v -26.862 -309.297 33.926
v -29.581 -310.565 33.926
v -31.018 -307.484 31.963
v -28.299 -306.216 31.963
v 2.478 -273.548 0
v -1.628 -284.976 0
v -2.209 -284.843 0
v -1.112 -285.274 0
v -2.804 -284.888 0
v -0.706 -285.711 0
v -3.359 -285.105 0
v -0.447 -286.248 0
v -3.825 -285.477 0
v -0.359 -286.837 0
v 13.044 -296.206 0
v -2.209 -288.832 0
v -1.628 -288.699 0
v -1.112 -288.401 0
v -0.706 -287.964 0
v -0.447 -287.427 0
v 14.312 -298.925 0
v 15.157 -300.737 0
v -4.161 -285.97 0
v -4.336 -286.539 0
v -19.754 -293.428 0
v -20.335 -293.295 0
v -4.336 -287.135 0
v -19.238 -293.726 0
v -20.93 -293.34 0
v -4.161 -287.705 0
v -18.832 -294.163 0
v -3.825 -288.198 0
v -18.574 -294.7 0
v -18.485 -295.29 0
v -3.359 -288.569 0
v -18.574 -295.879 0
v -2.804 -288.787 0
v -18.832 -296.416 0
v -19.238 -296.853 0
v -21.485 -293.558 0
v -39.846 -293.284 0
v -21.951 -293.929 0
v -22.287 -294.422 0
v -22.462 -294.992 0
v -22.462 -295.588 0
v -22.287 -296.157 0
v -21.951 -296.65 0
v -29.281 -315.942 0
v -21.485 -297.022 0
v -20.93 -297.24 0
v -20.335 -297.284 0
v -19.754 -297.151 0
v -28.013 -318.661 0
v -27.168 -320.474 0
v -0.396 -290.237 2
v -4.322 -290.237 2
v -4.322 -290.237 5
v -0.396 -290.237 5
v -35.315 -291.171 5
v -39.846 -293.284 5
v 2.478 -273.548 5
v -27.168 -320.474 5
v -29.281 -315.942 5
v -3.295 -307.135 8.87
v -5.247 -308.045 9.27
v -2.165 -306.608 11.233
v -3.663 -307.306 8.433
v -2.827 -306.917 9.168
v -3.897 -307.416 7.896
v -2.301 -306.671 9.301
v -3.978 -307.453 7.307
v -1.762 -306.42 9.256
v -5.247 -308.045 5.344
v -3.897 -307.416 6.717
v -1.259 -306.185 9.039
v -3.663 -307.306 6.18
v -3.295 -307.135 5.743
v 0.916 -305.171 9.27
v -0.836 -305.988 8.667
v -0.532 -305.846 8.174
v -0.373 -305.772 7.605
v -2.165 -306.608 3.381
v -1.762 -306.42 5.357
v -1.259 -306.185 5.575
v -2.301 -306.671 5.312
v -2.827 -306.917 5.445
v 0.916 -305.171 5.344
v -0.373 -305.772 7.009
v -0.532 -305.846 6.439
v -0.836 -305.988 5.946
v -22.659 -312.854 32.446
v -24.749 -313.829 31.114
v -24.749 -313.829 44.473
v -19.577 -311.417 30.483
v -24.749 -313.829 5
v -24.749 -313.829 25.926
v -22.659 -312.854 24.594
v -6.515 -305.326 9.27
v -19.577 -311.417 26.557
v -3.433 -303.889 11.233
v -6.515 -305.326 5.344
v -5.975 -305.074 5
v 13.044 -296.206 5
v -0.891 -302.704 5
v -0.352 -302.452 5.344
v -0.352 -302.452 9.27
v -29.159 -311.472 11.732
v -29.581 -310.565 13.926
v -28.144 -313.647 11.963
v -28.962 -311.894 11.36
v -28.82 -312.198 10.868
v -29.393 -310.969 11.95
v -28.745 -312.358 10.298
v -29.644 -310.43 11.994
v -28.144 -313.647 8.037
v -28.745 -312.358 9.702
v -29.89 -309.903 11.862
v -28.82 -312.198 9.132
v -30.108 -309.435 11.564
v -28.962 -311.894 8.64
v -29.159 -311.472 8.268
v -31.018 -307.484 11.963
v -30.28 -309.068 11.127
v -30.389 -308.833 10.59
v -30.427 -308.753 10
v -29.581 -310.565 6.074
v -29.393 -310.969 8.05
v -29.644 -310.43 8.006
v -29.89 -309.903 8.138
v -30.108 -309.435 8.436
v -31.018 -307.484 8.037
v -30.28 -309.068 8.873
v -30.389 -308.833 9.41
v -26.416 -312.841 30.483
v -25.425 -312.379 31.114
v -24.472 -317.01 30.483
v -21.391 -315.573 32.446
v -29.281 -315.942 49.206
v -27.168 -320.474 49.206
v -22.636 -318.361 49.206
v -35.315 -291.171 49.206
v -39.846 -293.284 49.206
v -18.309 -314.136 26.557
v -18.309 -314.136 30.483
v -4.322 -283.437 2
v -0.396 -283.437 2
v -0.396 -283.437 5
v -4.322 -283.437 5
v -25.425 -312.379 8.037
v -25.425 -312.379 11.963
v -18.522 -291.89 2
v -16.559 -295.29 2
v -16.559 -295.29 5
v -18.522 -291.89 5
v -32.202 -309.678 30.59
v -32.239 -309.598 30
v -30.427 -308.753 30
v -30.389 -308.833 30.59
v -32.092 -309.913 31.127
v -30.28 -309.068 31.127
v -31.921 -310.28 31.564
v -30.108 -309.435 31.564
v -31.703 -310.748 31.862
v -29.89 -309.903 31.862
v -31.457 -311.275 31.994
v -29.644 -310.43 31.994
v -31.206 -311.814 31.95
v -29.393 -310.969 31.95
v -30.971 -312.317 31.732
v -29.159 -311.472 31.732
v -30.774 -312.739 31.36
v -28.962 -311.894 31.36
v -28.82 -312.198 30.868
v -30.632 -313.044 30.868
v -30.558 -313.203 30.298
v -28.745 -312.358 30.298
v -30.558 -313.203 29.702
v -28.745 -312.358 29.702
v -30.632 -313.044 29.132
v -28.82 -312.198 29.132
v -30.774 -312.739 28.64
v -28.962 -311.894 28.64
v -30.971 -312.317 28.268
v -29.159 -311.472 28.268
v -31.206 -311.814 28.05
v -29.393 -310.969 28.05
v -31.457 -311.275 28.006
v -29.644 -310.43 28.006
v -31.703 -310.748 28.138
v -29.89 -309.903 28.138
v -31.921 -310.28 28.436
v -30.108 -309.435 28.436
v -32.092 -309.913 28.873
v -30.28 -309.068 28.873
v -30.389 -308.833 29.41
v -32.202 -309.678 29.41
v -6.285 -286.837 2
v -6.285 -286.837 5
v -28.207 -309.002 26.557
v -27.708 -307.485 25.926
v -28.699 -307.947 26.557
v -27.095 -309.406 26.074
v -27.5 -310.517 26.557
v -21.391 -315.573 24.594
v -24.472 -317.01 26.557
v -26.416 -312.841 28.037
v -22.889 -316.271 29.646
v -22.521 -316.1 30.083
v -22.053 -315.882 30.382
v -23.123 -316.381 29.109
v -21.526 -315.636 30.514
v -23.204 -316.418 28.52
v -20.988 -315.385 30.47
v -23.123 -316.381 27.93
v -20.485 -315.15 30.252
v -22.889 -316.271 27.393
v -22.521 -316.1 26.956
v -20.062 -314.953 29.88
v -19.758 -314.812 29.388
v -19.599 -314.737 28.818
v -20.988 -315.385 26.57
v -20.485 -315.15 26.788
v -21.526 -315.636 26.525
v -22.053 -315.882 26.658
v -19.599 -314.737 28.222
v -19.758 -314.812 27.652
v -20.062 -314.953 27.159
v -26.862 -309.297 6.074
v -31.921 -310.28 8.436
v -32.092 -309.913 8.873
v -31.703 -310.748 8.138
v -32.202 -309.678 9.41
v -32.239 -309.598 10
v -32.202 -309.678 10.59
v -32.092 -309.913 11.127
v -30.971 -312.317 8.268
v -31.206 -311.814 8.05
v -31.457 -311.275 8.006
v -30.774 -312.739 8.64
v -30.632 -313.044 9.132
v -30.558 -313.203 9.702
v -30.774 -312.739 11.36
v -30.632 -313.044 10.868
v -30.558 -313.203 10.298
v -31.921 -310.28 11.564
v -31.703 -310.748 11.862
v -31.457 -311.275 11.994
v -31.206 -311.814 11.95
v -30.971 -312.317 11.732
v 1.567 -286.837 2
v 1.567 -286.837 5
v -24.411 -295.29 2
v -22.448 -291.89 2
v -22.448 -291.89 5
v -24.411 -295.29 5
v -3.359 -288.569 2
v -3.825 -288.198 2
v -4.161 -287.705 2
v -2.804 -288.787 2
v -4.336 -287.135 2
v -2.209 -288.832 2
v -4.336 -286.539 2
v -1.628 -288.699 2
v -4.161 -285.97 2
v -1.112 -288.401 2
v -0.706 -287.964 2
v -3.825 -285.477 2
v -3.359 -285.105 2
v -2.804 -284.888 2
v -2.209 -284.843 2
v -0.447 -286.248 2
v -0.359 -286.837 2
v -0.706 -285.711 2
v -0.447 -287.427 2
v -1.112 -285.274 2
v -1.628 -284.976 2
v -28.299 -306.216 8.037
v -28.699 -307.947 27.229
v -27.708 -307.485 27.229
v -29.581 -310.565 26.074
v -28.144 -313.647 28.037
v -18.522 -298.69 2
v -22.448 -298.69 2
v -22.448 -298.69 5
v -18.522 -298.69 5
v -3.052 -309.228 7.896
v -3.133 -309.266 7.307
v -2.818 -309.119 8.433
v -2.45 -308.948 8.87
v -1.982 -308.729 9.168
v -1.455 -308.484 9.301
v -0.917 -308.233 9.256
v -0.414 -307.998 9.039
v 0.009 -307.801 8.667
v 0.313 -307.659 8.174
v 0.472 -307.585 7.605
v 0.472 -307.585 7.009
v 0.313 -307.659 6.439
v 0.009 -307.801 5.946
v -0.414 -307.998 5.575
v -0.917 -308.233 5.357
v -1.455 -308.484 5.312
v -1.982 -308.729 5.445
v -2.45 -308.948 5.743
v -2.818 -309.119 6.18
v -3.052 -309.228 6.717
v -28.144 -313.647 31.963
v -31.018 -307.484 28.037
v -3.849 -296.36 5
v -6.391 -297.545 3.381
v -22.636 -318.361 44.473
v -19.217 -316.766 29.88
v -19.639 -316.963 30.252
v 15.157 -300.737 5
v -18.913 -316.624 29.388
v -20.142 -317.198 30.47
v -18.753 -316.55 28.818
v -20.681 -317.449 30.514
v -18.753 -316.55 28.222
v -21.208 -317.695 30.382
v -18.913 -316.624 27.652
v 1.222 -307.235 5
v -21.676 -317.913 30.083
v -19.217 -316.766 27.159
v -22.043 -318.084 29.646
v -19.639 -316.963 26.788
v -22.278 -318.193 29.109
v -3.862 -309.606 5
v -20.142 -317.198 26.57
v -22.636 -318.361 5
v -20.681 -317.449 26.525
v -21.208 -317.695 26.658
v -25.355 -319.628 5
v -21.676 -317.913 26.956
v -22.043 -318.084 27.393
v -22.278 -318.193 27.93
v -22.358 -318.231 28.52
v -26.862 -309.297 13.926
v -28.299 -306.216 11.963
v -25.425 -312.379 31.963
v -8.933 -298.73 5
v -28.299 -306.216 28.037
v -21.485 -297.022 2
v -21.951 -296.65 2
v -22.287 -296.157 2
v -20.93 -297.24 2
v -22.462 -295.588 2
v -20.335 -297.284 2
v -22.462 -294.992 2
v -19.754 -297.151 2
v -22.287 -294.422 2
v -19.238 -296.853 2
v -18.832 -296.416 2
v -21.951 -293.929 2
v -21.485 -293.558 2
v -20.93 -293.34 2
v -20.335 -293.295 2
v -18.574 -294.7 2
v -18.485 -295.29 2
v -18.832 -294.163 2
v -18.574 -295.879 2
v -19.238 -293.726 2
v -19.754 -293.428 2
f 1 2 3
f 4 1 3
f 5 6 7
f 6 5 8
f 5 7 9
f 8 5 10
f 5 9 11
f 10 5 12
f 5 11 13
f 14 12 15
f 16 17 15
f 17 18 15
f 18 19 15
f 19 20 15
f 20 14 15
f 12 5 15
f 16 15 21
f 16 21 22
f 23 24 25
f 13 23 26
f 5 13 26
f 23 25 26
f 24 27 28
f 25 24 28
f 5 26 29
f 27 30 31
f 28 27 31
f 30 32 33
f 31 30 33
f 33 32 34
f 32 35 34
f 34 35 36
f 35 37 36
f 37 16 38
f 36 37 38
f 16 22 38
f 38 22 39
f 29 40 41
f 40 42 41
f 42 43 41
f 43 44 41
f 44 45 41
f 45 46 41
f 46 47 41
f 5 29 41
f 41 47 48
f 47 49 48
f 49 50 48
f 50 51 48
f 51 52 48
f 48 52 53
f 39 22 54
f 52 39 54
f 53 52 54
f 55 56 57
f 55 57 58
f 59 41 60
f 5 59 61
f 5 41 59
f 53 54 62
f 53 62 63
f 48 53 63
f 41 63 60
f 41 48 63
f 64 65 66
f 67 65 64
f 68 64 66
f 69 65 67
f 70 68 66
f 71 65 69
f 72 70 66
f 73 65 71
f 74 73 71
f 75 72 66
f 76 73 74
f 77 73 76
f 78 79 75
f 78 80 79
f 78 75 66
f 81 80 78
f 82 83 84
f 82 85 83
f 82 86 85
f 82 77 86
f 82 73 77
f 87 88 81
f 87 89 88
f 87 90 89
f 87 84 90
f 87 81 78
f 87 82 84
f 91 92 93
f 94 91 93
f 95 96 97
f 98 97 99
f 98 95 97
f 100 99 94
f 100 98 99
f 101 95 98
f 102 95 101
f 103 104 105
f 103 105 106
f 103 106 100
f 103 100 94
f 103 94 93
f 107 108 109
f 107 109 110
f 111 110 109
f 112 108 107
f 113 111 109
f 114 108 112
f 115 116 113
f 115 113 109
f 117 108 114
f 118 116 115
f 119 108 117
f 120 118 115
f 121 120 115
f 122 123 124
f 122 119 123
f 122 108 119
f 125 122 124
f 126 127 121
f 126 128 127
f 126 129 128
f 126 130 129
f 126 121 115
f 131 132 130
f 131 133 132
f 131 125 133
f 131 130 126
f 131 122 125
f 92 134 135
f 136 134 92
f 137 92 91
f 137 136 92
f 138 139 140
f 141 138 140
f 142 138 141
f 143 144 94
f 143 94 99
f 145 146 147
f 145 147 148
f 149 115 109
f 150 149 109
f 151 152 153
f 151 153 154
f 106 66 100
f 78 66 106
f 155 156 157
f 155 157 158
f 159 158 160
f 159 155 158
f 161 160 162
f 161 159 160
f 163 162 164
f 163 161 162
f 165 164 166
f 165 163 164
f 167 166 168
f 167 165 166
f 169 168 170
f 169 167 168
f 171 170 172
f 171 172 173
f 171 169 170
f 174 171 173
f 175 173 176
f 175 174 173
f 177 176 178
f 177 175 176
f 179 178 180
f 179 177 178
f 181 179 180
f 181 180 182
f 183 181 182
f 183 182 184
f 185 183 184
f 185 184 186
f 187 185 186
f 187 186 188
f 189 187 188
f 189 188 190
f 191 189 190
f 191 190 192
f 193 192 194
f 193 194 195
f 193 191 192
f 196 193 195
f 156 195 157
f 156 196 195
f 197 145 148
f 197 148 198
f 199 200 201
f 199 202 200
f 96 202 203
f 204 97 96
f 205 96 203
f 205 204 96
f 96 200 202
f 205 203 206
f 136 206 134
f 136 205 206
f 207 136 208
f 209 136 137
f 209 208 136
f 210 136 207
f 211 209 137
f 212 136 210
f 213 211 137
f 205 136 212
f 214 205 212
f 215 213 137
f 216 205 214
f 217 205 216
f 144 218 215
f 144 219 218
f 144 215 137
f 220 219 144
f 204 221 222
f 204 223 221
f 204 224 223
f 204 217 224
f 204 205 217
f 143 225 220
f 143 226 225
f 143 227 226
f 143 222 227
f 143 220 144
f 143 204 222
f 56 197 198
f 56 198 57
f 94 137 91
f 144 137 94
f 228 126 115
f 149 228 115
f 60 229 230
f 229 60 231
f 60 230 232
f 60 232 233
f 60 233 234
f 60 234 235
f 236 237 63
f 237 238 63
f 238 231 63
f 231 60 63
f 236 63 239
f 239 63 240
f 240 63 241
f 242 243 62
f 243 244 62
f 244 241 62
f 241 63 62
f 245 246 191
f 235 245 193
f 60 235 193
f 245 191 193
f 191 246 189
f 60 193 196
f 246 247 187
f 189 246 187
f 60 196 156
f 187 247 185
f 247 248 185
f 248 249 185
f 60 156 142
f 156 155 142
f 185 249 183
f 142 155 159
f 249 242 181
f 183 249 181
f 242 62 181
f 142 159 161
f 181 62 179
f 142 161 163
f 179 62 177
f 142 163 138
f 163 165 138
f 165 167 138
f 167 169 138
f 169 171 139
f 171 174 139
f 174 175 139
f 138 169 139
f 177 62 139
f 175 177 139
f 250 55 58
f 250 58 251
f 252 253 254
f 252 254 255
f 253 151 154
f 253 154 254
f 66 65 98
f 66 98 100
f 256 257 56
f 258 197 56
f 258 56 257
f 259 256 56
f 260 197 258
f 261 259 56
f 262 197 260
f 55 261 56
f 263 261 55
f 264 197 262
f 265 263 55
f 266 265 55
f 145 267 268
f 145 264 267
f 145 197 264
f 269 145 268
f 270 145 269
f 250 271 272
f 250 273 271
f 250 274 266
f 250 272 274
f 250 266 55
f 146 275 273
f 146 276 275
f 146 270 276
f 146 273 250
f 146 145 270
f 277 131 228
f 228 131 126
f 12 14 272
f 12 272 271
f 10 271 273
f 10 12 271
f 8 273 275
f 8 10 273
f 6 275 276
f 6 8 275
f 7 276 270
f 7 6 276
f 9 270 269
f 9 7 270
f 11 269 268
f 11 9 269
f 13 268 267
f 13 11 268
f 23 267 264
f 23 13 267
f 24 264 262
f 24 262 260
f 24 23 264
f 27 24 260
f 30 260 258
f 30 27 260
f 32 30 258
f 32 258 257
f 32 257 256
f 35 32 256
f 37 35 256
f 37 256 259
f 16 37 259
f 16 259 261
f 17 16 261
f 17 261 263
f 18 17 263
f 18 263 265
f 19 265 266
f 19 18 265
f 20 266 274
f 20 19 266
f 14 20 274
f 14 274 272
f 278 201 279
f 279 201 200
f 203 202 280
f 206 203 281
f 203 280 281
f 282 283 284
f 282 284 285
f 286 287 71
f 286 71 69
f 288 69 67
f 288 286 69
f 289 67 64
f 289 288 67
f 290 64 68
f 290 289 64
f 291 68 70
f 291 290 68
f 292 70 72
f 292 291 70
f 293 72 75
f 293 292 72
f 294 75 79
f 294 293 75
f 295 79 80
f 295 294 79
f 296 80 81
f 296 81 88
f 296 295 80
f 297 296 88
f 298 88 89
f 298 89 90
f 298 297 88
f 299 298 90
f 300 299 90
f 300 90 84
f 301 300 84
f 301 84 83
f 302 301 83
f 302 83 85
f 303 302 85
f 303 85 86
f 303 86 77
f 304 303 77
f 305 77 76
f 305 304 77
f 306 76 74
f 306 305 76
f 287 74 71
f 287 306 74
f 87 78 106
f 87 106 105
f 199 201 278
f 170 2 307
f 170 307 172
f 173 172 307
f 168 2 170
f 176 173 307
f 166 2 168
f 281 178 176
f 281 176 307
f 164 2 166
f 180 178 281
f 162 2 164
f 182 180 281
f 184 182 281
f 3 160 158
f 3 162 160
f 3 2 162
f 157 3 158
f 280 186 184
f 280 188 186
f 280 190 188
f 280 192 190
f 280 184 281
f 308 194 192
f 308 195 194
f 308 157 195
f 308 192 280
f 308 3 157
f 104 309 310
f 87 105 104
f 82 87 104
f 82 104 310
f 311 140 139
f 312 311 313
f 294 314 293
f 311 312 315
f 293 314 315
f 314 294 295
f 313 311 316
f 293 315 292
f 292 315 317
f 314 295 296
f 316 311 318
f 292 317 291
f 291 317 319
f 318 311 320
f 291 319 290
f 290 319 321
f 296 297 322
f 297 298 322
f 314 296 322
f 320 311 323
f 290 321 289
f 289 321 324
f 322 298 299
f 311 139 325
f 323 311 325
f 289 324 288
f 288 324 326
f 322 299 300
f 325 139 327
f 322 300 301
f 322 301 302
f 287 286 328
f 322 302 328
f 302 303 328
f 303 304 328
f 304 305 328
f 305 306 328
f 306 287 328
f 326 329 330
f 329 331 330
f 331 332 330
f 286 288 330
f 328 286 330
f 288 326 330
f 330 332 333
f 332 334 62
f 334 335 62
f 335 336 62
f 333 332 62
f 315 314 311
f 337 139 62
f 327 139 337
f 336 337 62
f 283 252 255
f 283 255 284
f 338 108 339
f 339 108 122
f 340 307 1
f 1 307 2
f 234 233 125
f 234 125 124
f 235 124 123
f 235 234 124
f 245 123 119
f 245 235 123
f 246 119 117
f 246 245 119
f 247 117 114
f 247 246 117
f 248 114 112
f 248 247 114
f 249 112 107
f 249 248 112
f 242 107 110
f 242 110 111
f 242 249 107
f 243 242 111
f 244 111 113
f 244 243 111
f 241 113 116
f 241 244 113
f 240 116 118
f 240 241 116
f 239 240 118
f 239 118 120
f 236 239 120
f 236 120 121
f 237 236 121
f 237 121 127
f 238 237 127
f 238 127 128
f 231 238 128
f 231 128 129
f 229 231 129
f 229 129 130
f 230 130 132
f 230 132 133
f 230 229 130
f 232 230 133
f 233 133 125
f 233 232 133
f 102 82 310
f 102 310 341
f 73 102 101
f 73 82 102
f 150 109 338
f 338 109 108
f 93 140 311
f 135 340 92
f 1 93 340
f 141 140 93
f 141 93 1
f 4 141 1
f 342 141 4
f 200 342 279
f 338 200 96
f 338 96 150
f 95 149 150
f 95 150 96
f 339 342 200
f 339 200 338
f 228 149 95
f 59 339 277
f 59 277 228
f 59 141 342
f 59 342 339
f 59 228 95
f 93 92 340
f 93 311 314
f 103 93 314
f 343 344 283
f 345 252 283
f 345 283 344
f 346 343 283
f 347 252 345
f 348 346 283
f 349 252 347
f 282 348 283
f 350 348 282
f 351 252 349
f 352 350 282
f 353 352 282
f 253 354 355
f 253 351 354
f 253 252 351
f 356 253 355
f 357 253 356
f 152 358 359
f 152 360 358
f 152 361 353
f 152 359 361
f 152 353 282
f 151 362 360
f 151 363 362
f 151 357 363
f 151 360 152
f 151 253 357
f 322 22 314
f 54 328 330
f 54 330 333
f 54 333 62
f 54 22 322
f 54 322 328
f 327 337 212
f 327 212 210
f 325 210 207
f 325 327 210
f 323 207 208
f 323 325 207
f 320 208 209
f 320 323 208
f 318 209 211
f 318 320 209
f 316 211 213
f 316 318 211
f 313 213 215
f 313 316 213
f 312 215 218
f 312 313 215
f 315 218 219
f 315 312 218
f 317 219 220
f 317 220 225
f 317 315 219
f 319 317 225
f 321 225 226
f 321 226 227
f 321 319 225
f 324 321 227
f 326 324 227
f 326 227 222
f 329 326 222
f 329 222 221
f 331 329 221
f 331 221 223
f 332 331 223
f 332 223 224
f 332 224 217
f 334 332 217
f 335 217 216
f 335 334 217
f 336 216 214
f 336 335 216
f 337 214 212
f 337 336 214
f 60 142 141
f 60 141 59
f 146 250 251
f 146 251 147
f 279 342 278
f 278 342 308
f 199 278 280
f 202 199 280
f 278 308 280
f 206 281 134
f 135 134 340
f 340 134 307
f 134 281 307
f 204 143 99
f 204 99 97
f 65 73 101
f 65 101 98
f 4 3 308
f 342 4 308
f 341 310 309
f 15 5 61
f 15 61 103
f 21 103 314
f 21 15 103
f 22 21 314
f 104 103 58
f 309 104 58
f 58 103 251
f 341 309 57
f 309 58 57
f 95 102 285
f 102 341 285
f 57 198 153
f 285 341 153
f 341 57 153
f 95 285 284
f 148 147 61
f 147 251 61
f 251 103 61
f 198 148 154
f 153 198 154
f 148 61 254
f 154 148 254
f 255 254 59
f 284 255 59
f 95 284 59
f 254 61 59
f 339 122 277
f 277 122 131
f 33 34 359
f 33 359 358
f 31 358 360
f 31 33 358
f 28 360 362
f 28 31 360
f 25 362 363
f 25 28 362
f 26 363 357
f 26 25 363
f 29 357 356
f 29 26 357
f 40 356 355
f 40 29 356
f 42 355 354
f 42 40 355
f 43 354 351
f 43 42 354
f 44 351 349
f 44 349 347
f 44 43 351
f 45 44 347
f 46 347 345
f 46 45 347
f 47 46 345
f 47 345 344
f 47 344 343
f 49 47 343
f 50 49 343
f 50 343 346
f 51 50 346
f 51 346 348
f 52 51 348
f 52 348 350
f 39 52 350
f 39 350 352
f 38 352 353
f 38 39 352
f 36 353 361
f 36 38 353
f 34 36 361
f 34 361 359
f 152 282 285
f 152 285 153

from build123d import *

# Parameters (mm, degrees)
SKETCH1_R           = 2
BOSS_EXTRUDE1_DEPTH = 2
BOSS_EXTRUDE2_START = 2
BOSS_EXTRUDE2_DEPTH = 3
SKETCH3_R           = 2
BOSS_EXTRUDE3_DEPTH = 2
BOSS_EXTRUDE4_START = 2
BOSS_EXTRUDE4_DEPTH = 3
SKETCH4_W           = 44.205836774
SKETCH4_H           = 30
SKETCH4_R           = 2
BOSS_EXTRUDE5_DEPTH = 2
BOSS_EXTRUDE6_START = 2
SKETCH4_4_W         = 44.205836774
SKETCH4_4_H         = 30
BOSS_EXTRUDE6_DEPTH = 3
CUT_EXTRUDE1_START  = 2
SKETCH3_5_R         = 2
CUT_EXTRUDE1_DEPTH  = 10


with BuildPart() as part:
    # Sketch1 → Boss-Extrude1 (new body)
    # profile 1 of 3: a face of its own
    with BuildSketch(Plane.XY):
        Polygon((15.156849888, -300.73734036), (-27.167723767, -320.473613183), (-39.846271619, -293.284379572), (2.478302036, -273.548106749), align=None)
        Polygon((-22.447739873, -291.889732471), (-24.410730789, -295.289732471), (-22.447739873, -298.689732471), (-18.521758043, -298.689732471), (-16.558767128, -295.289732471), (-18.521758043, -291.889732471), align=None, mode=Mode.SUBTRACT)
        Polygon((-4.321584133, -283.437367237), (-6.284575048, -286.837367237), (-4.321584133, -290.237367237), (-0.395602302, -290.237367237), (1.567388613, -286.837367237), (-0.395602302, -283.437367237), align=None, mode=Mode.SUBTRACT)
    # profile 2 of 3: a face of its own
    with BuildSketch(Plane.XY):
        Polygon((-0.395602302, -283.437367237), (-4.321584133, -283.437367237), (-6.284575048, -286.837367237), (-4.321584133, -290.237367237), (-0.395602302, -290.237367237), (1.567388613, -286.837367237), align=None)
        with Locations((-2.358593217, -286.837367237)):
            Circle(SKETCH1_R, mode=Mode.SUBTRACT)
    # profile 3 of 3: a face of its own
    with BuildSketch(Plane.XY):
        Polygon((-18.521758043, -291.889732471), (-22.447739873, -291.889732471), (-24.410730789, -295.289732471), (-22.447739873, -298.689732471), (-18.521758043, -298.689732471), (-16.558767128, -295.289732471), align=None)
        with Locations((-20.484748958, -295.289732471)):
            Circle(SKETCH1_R, mode=Mode.SUBTRACT)
    extrude(amount=BOSS_EXTRUDE1_DEPTH)

    # Sketch1<3> → Boss-Extrude2 (add)
    with BuildSketch(Plane.XY.offset(BOSS_EXTRUDE2_START)):
        Polygon((15.156849888, -300.73734036), (-27.167723767, -320.473613183), (-39.846271619, -293.284379572), (2.478302036, -273.548106749), align=None)
        Polygon((-22.447739873, -291.889732471), (-24.410730789, -295.289732471), (-22.447739873, -298.689732471), (-18.521758043, -298.689732471), (-16.558767128, -295.289732471), (-18.521758043, -291.889732471), align=None, mode=Mode.SUBTRACT)
        Polygon((-4.321584133, -283.437367237), (-6.284575048, -286.837367237), (-4.321584133, -290.237367237), (-0.395602302, -290.237367237), (1.567388613, -286.837367237), (-0.395602302, -283.437367237), align=None, mode=Mode.SUBTRACT)
    extrude(amount=BOSS_EXTRUDE2_DEPTH)

    # Sketch3 → Boss-Extrude3 (add)
    # profile 1 of 3: a face of its own
    with BuildSketch(Plane(origin=(117.8961915, -252.829198573, 0), x_dir=(0.9063077870366509, 0.42261826174069744, 0), z_dir=(-0.42261826174069744, 0.9063077870366509, 0))):
        Polygon((-113.360320943, 0), (-160.060320943, 0), (-160.060320943, -5), (-160.060320943, -49.205836774), (-113.360320943, -5), align=None)
        Polygon((-149.353719225, -30.482796069), (-149.353719225, -26.556814238), (-152.753719225, -24.593823323), (-156.153719225, -26.556814238), (-156.153719225, -30.482796069), (-152.753719225, -32.445786984), align=None, mode=Mode.SUBTRACT)
        Polygon((-128.14051579, -5.343610803), (-131.54051579, -3.380619887), (-134.94051579, -5.343610803), (-134.94051579, -9.269592633), (-131.54051579, -11.232583548), (-128.14051579, -9.269592633), align=None, mode=Mode.SUBTRACT)
    # profile 2 of 3: a face of its own
    with BuildSketch(Plane(origin=(117.8961915, -252.829198573, 0), x_dir=(0.9063077870366509, 0.42261826174069744, 0), z_dir=(-0.42261826174069744, 0.9063077870366509, 0))):
        Polygon((-128.14051579, -5.343610803), (-128.735667158, -5), (-134.345364422, -5), (-134.94051579, -5.343610803), (-134.94051579, -9.269592633), (-131.54051579, -11.232583548), (-128.14051579, -9.269592633), align=None)
        with Locations(Location((-131.54051579, -7.306601718, 0), (0, 0, 180))):
            Circle(SKETCH3_R, mode=Mode.SUBTRACT)
    # profile 3 of 3: a face of its own
    with BuildSketch(Plane(origin=(117.8961915, -252.829198573, 0), x_dir=(0.9063077870366509, 0.42261826174069744, 0), z_dir=(-0.42261826174069744, 0.9063077870366509, 0))):
        Polygon((-149.353719225, -30.482796069), (-149.353719225, -26.556814238), (-152.753719225, -24.593823323), (-156.153719225, -26.556814238), (-156.153719225, -30.482796069), (-152.753719225, -32.445786984), align=None)
        with Locations(Location((-152.753719225, -28.519805153, 0), (0, 0, 180))):
            Circle(SKETCH3_R, mode=Mode.SUBTRACT)
    extrude(amount=BOSS_EXTRUDE3_DEPTH)

    # Sketch3<4> → Boss-Extrude4 (add)
    with BuildSketch(Plane(origin=(117.8961915, -252.829198573, 0), x_dir=(0.9063077870366509, 0.42261826174069744, 0), z_dir=(-0.42261826174069744, 0.9063077870366509, 0)).offset(BOSS_EXTRUDE4_START)):
        Polygon((-113.360320943, 0), (-160.060320943, 0), (-160.060320943, -5), (-160.060320943, -49.205836774), (-113.360320943, -5), align=None)
        Polygon((-149.353719225, -30.482796069), (-149.353719225, -26.556814238), (-152.753719225, -24.593823323), (-156.153719225, -26.556814238), (-156.153719225, -30.482796069), (-152.753719225, -32.445786984), align=None, mode=Mode.SUBTRACT)
        Polygon((-128.14051579, -5.343610803), (-131.54051579, -3.380619887), (-134.94051579, -5.343610803), (-134.94051579, -9.269592633), (-131.54051579, -11.232583548), (-128.14051579, -9.269592633), align=None, mode=Mode.SUBTRACT)
    extrude(amount=BOSS_EXTRUDE4_DEPTH)

    # Sketch4 → Boss-Extrude5 (add)
    # profile 1 of 3: a face of its own
    with BuildSketch(Plane(origin=(-145.063915266, -67.644414611, 0), x_dir=(0, 0, -1), z_dir=(0.9063077870366509, 0.42261826174069744, 1.6586764924388181e-15))):
        with Locations((-27.102918387, -263.966154974)):
            Rectangle(SKETCH4_W, SKETCH4_H)
        Polygon((-31.962990915, -272.366154974), (-33.92598183, -268.966154974), (-31.962990915, -265.566154974), (-28.037009085, -265.566154974), (-26.07401817, -268.966154974), (-28.037009085, -272.366154974), align=None, mode=Mode.SUBTRACT)
        Polygon((-11.962990915, -272.366154974), (-13.92598183, -268.966154974), (-11.962990915, -265.566154974), (-8.037009085, -265.566154974), (-6.07401817, -268.966154974), (-8.037009085, -272.366154974), align=None, mode=Mode.SUBTRACT)
    # profile 2 of 3: a face of its own
    with BuildSketch(Plane(origin=(-145.063915266, -67.644414611, 0), x_dir=(0, 0, -1), z_dir=(0.9063077870366509, 0.42261826174069744, 1.6586764924388181e-15))):
        Polygon((-28.037009085, -265.566154974), (-31.962990915, -265.566154974), (-33.92598183, -268.966154974), (-31.962990915, -272.366154974), (-28.037009085, -272.366154974), (-26.07401817, -268.966154974), align=None)
        with Locations(Location((-30, -268.966154974, 0), (0, 0, 90))):
            Circle(SKETCH4_R, mode=Mode.SUBTRACT)
    # profile 3 of 3: a face of its own
    with BuildSketch(Plane(origin=(-145.063915266, -67.644414611, 0), x_dir=(0, 0, -1), z_dir=(0.9063077870366509, 0.42261826174069744, 1.6586764924388181e-15))):
        Polygon((-8.037009085, -265.566154974), (-11.962990915, -265.566154974), (-13.92598183, -268.966154974), (-11.962990915, -272.366154974), (-8.037009085, -272.366154974), (-6.07401817, -268.966154974), align=None)
        with Locations(Location((-10, -268.966154974, 0), (0, 0, 90))):
            Circle(SKETCH4_R, mode=Mode.SUBTRACT)
    extrude(amount=BOSS_EXTRUDE5_DEPTH)

    # Sketch4<4> → Boss-Extrude6 (add)
    with BuildSketch(Plane(origin=(-145.063915266, -67.644414611, 0), x_dir=(0, 0, -1), z_dir=(0.9063077870366509, 0.42261826174069744, 1.6586764924388181e-15)).offset(BOSS_EXTRUDE6_START)):
        with Locations((-27.102918387, -263.966154974)):
            Rectangle(SKETCH4_4_W, SKETCH4_4_H)
        Polygon((-31.962990915, -272.366154974), (-33.92598183, -268.966154974), (-31.962990915, -265.566154974), (-28.037009085, -265.566154974), (-26.07401817, -268.966154974), (-28.037009085, -272.366154974), align=None, mode=Mode.SUBTRACT)
        Polygon((-11.962990915, -272.366154974), (-13.92598183, -268.966154974), (-11.962990915, -265.566154974), (-8.037009085, -265.566154974), (-6.07401817, -268.966154974), (-8.037009085, -272.366154974), align=None, mode=Mode.SUBTRACT)
    extrude(amount=BOSS_EXTRUDE6_DEPTH)

    # Sketch3<5> → Cut-Extrude1 (cut)
    # profile 1 of 2: a face of its own
    with BuildSketch(Plane(origin=(117.8961915, -252.829198573, 0), x_dir=(0.9063077870366509, 0.42261826174069744, 0), z_dir=(-0.42261826174069744, 0.9063077870366509, 0)).offset(CUT_EXTRUDE1_START)):
        Polygon((-128.14051579, -5.343610803), (-131.54051579, -3.380619887), (-134.94051579, -5.343610803), (-134.94051579, -9.269592633), (-131.54051579, -11.232583548), (-128.14051579, -9.269592633), align=None)
        with Locations(Location((-131.54051579, -7.306601718, 0), (0, 0, 180))):
            Circle(SKETCH3_5_R, mode=Mode.SUBTRACT)
    # profile 2 of 2: a face of its own
    with BuildSketch(Plane(origin=(117.8961915, -252.829198573, 0), x_dir=(0.9063077870366509, 0.42261826174069744, 0), z_dir=(-0.42261826174069744, 0.9063077870366509, 0)).offset(CUT_EXTRUDE1_START)):
        Polygon((-149.353719225, -30.482796069), (-149.353719225, -26.556814238), (-152.753719225, -24.593823323), (-156.153719225, -26.556814238), (-156.153719225, -30.482796069), (-152.753719225, -32.445786984), align=None)
        with Locations(Location((-152.753719225, -28.519805153, 0), (0, 0, 180))):
            Circle(SKETCH3_5_R, mode=Mode.SUBTRACT)
    extrude(amount=CUT_EXTRUDE1_DEPTH, mode=Mode.SUBTRACT)


solid = part.part
